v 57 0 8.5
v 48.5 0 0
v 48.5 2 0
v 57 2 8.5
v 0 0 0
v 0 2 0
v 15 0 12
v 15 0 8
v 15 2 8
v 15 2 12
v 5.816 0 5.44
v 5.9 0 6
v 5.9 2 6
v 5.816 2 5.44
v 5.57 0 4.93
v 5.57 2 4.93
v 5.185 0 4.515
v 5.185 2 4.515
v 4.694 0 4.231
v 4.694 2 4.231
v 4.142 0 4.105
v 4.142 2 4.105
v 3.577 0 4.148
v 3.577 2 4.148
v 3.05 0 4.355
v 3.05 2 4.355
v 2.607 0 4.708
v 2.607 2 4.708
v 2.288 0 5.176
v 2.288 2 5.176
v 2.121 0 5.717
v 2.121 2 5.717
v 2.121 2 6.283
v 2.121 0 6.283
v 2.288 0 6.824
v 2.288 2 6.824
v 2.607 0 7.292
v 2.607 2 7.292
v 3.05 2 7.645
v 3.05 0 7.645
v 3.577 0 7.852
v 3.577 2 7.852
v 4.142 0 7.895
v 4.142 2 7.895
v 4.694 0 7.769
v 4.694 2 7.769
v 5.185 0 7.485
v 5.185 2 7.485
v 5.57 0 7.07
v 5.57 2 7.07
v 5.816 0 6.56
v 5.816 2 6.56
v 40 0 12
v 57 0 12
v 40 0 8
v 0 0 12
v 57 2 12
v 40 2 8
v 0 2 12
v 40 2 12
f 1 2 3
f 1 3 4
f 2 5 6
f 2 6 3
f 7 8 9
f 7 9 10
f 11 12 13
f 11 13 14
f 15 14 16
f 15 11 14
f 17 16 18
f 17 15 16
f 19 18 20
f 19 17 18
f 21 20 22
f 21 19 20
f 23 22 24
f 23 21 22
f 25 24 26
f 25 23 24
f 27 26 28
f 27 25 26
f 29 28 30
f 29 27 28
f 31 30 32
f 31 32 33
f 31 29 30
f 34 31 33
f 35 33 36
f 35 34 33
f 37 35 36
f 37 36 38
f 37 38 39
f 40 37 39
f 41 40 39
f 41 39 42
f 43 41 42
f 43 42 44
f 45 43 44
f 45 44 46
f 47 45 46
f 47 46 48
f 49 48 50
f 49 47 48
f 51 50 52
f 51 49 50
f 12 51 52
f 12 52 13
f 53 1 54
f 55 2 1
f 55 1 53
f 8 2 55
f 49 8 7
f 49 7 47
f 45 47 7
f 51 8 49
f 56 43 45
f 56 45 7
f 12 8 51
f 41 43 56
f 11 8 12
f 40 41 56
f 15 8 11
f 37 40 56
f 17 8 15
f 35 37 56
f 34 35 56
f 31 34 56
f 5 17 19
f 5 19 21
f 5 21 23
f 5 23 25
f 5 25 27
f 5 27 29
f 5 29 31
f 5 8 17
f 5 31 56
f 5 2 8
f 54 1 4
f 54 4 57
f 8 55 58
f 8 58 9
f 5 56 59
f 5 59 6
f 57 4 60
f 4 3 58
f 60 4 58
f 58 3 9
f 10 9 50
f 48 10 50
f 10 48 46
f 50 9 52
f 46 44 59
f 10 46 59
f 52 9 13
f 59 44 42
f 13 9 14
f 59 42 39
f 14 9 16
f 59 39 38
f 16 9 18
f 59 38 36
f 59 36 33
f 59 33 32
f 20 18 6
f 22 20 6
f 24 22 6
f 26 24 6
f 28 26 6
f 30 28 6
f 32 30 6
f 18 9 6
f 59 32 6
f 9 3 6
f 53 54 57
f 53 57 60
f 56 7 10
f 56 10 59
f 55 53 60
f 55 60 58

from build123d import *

# Parameters (mm, degrees)
SKETCH_1_R      = 1.9
EXTRUDE_1_DEPTH = 2


with BuildPart() as part:
    # Эскиз1 → Бобышка-Вытянуть1 (new body)
    with BuildSketch(Plane(origin=(0, 0, 0), x_dir=(1, 0, 0), z_dir=(0, 1, 0))):
        Polygon((0, 0), (48.5, 0), (57, -8.5), (57, -12), (40, -12), (40, -8), (15, -8), (15, -12), (0, -12), align=None)
        with Locations((4, -6)):
            Circle(SKETCH_1_R, mode=Mode.SUBTRACT)
    extrude(amount=EXTRUDE_1_DEPTH)


solid = part.part
